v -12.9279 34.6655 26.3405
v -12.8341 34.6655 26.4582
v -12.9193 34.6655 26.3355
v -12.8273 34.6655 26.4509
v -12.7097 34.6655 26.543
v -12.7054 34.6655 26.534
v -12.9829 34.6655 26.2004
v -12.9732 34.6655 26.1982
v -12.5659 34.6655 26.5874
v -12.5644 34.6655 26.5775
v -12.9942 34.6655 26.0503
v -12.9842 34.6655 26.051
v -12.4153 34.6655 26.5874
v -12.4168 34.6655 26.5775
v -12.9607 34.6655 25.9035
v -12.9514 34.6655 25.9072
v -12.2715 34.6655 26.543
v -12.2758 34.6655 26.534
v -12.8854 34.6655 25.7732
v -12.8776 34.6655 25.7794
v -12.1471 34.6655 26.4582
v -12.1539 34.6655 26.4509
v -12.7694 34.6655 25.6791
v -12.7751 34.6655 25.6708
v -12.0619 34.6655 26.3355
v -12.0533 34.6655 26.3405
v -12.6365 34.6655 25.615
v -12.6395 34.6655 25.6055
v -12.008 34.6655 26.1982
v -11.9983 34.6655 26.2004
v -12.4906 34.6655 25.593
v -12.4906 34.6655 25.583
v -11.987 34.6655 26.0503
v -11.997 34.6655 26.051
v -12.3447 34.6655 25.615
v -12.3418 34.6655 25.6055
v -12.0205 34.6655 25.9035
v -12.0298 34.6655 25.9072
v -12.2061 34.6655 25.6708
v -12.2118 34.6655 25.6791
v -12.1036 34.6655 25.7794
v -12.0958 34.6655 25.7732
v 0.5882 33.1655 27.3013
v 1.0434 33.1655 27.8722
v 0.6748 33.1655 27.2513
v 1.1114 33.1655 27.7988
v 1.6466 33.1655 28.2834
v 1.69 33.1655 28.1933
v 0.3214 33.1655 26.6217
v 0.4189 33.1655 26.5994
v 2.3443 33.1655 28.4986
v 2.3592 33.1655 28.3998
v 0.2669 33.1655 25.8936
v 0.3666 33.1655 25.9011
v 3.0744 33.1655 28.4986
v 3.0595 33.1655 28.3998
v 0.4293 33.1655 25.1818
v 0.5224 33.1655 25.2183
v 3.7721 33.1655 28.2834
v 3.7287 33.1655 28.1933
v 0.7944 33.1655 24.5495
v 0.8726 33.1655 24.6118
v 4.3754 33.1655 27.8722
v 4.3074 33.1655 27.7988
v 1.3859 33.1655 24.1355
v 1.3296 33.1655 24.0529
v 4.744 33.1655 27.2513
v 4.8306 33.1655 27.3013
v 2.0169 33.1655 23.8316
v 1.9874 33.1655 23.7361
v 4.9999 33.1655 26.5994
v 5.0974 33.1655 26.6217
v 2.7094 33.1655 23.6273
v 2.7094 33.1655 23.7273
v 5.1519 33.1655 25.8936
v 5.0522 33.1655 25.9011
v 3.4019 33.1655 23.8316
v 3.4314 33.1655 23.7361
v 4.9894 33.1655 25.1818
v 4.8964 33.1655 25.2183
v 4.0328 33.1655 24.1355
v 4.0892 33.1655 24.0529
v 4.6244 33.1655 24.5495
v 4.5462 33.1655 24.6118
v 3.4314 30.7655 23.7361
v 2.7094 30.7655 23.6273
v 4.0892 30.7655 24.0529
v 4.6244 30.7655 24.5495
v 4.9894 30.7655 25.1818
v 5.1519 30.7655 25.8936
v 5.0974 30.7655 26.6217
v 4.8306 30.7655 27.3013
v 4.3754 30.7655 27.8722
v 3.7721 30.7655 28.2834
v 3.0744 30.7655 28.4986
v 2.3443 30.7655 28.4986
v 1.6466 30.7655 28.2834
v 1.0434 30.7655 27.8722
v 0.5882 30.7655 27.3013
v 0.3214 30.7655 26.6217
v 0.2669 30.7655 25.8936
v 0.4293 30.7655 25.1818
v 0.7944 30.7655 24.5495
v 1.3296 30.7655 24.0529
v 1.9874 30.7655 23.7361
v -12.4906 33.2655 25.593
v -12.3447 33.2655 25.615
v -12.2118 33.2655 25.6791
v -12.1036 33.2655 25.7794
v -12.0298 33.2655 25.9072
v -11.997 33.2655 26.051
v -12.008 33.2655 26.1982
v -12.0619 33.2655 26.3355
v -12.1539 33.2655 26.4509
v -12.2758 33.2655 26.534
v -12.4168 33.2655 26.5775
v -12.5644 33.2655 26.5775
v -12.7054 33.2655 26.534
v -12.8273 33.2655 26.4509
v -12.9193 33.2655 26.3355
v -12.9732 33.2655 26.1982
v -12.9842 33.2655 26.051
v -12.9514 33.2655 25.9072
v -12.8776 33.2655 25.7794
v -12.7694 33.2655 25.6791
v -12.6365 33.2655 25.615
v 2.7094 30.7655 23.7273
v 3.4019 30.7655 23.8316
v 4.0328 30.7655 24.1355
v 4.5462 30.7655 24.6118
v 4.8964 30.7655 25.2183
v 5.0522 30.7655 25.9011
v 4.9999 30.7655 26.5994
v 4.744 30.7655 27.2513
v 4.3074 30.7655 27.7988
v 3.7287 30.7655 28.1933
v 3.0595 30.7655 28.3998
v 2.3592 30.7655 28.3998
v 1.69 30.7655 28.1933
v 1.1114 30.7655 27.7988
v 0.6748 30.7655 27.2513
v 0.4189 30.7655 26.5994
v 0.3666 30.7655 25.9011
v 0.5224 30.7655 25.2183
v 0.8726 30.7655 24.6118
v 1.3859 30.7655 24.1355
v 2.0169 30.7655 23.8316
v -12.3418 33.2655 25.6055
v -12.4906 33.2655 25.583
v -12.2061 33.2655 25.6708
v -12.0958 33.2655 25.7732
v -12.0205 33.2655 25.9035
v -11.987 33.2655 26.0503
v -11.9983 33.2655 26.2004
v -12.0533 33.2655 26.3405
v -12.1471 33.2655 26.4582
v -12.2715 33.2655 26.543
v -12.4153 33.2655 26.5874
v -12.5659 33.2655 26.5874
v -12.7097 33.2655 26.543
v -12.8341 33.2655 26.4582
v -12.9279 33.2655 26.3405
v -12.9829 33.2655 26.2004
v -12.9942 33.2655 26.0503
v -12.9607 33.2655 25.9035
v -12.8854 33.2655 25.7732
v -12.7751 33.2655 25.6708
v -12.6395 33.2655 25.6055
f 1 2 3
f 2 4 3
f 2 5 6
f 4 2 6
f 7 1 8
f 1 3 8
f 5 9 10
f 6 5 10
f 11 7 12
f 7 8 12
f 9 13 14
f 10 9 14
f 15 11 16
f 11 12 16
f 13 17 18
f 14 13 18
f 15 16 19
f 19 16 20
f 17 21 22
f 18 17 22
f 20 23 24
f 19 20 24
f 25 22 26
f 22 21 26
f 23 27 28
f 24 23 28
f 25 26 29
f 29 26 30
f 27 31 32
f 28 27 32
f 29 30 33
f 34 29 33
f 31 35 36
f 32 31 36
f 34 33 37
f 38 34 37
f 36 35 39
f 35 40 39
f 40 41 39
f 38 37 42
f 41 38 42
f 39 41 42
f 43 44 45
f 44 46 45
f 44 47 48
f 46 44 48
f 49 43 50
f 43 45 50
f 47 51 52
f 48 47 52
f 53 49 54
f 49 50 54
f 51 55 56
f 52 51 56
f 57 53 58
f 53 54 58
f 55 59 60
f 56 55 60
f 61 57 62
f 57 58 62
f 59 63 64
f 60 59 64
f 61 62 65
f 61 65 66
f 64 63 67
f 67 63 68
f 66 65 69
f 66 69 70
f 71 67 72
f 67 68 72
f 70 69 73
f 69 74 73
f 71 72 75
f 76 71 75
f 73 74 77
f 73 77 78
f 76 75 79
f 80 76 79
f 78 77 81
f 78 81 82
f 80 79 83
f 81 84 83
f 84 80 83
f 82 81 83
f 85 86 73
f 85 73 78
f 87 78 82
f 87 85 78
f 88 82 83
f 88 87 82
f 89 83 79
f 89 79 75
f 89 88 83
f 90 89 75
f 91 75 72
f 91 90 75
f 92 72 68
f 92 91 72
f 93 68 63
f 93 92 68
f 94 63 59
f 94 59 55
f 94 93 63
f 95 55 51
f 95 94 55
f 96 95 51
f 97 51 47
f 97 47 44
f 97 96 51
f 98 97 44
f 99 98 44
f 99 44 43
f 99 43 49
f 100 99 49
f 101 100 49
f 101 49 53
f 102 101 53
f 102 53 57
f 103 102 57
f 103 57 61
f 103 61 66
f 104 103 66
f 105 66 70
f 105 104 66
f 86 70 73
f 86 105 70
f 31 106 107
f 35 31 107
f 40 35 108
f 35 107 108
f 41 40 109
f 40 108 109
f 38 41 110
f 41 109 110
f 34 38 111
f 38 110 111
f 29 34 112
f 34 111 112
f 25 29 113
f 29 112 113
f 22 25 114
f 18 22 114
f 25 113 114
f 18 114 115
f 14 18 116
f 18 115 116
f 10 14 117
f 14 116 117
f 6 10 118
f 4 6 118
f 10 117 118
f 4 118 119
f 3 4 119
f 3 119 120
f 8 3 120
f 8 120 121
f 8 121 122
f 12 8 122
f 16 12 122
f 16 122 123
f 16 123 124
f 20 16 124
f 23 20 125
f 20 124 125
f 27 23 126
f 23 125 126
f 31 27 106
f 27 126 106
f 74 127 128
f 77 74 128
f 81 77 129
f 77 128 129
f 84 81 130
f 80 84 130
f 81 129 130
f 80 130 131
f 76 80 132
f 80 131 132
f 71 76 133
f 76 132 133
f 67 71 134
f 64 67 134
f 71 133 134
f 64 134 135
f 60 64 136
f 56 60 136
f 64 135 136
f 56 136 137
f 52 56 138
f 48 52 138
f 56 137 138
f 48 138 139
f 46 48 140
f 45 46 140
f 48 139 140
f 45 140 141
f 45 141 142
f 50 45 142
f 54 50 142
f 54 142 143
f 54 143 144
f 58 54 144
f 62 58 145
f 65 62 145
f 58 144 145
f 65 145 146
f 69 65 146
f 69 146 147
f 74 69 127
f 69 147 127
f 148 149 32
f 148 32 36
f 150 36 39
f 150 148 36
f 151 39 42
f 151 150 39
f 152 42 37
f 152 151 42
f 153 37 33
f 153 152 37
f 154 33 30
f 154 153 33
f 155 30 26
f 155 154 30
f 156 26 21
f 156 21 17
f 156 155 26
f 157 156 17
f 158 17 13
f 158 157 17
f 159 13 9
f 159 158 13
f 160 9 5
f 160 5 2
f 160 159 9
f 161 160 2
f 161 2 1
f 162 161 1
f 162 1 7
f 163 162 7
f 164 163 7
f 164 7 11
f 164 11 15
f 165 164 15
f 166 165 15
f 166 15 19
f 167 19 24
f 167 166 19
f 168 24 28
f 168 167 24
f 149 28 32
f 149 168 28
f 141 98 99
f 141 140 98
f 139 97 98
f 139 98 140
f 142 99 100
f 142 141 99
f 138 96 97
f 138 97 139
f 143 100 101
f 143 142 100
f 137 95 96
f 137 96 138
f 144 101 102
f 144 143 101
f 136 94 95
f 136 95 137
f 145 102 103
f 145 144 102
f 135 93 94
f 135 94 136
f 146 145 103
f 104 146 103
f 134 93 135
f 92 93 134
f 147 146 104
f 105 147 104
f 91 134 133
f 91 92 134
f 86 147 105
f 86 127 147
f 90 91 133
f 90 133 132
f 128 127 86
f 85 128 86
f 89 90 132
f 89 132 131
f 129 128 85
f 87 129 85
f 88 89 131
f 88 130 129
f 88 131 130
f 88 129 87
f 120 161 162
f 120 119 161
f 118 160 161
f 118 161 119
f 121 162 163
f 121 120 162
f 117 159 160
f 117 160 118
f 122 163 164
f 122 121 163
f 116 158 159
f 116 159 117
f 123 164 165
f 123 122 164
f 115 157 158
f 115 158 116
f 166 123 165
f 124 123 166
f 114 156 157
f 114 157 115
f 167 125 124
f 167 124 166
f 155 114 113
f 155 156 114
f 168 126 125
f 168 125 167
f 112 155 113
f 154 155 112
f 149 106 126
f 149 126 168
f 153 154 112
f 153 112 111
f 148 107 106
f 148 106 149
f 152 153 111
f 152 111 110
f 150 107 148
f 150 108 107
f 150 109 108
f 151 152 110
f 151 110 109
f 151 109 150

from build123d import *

# Parameters (mm, degrees)
SKETCH_1_R      = 2.449376165
SKETCH_1_R_2    = 2.349376165
EXTRUDE_1_DEPTH = 2.4
SKETCH_2_R      = 0.505
SKETCH_2_R_2    = 0.495
EXTRUDE_3_DEPTH = 1.4


# Read off the part's stored shape, not the designer's step: microservoAssembly.STEP-1/microservoArm_A2.STEP-1-surface1
with BuildPart() as part:
    # 草图1 → 凸台-拉伸1 (new body)
    with BuildSketch(Plane.XZ.offset(-30.765480349)):
        with Locations(Location((2.709389171, 26.076630937, 0), (0, 0, 270))):
            Circle(SKETCH_1_R)
        with Locations(Location((2.709389171, 26.076630937, 0), (0, 0, 270))):
            Circle(SKETCH_1_R_2, mode=Mode.SUBTRACT)
    extrude(amount=-EXTRUDE_1_DEPTH)


with BuildPart() as body_2:
    # 草图2 → 凸台-拉伸3 (new body)
    with BuildSketch(Plane.XZ.offset(-33.265480349)):
        with Locations(Location((-12.490606547, 26.088039712, 0), (0, 0, 270))):
            Circle(SKETCH_2_R)
        with Locations(Location((-12.490606547, 26.088039712, 0), (0, 0, 270))):
            Circle(SKETCH_2_R_2, mode=Mode.SUBTRACT)
    extrude(amount=-EXTRUDE_3_DEPTH)


solid = Compound([part.part, body_2.part])
